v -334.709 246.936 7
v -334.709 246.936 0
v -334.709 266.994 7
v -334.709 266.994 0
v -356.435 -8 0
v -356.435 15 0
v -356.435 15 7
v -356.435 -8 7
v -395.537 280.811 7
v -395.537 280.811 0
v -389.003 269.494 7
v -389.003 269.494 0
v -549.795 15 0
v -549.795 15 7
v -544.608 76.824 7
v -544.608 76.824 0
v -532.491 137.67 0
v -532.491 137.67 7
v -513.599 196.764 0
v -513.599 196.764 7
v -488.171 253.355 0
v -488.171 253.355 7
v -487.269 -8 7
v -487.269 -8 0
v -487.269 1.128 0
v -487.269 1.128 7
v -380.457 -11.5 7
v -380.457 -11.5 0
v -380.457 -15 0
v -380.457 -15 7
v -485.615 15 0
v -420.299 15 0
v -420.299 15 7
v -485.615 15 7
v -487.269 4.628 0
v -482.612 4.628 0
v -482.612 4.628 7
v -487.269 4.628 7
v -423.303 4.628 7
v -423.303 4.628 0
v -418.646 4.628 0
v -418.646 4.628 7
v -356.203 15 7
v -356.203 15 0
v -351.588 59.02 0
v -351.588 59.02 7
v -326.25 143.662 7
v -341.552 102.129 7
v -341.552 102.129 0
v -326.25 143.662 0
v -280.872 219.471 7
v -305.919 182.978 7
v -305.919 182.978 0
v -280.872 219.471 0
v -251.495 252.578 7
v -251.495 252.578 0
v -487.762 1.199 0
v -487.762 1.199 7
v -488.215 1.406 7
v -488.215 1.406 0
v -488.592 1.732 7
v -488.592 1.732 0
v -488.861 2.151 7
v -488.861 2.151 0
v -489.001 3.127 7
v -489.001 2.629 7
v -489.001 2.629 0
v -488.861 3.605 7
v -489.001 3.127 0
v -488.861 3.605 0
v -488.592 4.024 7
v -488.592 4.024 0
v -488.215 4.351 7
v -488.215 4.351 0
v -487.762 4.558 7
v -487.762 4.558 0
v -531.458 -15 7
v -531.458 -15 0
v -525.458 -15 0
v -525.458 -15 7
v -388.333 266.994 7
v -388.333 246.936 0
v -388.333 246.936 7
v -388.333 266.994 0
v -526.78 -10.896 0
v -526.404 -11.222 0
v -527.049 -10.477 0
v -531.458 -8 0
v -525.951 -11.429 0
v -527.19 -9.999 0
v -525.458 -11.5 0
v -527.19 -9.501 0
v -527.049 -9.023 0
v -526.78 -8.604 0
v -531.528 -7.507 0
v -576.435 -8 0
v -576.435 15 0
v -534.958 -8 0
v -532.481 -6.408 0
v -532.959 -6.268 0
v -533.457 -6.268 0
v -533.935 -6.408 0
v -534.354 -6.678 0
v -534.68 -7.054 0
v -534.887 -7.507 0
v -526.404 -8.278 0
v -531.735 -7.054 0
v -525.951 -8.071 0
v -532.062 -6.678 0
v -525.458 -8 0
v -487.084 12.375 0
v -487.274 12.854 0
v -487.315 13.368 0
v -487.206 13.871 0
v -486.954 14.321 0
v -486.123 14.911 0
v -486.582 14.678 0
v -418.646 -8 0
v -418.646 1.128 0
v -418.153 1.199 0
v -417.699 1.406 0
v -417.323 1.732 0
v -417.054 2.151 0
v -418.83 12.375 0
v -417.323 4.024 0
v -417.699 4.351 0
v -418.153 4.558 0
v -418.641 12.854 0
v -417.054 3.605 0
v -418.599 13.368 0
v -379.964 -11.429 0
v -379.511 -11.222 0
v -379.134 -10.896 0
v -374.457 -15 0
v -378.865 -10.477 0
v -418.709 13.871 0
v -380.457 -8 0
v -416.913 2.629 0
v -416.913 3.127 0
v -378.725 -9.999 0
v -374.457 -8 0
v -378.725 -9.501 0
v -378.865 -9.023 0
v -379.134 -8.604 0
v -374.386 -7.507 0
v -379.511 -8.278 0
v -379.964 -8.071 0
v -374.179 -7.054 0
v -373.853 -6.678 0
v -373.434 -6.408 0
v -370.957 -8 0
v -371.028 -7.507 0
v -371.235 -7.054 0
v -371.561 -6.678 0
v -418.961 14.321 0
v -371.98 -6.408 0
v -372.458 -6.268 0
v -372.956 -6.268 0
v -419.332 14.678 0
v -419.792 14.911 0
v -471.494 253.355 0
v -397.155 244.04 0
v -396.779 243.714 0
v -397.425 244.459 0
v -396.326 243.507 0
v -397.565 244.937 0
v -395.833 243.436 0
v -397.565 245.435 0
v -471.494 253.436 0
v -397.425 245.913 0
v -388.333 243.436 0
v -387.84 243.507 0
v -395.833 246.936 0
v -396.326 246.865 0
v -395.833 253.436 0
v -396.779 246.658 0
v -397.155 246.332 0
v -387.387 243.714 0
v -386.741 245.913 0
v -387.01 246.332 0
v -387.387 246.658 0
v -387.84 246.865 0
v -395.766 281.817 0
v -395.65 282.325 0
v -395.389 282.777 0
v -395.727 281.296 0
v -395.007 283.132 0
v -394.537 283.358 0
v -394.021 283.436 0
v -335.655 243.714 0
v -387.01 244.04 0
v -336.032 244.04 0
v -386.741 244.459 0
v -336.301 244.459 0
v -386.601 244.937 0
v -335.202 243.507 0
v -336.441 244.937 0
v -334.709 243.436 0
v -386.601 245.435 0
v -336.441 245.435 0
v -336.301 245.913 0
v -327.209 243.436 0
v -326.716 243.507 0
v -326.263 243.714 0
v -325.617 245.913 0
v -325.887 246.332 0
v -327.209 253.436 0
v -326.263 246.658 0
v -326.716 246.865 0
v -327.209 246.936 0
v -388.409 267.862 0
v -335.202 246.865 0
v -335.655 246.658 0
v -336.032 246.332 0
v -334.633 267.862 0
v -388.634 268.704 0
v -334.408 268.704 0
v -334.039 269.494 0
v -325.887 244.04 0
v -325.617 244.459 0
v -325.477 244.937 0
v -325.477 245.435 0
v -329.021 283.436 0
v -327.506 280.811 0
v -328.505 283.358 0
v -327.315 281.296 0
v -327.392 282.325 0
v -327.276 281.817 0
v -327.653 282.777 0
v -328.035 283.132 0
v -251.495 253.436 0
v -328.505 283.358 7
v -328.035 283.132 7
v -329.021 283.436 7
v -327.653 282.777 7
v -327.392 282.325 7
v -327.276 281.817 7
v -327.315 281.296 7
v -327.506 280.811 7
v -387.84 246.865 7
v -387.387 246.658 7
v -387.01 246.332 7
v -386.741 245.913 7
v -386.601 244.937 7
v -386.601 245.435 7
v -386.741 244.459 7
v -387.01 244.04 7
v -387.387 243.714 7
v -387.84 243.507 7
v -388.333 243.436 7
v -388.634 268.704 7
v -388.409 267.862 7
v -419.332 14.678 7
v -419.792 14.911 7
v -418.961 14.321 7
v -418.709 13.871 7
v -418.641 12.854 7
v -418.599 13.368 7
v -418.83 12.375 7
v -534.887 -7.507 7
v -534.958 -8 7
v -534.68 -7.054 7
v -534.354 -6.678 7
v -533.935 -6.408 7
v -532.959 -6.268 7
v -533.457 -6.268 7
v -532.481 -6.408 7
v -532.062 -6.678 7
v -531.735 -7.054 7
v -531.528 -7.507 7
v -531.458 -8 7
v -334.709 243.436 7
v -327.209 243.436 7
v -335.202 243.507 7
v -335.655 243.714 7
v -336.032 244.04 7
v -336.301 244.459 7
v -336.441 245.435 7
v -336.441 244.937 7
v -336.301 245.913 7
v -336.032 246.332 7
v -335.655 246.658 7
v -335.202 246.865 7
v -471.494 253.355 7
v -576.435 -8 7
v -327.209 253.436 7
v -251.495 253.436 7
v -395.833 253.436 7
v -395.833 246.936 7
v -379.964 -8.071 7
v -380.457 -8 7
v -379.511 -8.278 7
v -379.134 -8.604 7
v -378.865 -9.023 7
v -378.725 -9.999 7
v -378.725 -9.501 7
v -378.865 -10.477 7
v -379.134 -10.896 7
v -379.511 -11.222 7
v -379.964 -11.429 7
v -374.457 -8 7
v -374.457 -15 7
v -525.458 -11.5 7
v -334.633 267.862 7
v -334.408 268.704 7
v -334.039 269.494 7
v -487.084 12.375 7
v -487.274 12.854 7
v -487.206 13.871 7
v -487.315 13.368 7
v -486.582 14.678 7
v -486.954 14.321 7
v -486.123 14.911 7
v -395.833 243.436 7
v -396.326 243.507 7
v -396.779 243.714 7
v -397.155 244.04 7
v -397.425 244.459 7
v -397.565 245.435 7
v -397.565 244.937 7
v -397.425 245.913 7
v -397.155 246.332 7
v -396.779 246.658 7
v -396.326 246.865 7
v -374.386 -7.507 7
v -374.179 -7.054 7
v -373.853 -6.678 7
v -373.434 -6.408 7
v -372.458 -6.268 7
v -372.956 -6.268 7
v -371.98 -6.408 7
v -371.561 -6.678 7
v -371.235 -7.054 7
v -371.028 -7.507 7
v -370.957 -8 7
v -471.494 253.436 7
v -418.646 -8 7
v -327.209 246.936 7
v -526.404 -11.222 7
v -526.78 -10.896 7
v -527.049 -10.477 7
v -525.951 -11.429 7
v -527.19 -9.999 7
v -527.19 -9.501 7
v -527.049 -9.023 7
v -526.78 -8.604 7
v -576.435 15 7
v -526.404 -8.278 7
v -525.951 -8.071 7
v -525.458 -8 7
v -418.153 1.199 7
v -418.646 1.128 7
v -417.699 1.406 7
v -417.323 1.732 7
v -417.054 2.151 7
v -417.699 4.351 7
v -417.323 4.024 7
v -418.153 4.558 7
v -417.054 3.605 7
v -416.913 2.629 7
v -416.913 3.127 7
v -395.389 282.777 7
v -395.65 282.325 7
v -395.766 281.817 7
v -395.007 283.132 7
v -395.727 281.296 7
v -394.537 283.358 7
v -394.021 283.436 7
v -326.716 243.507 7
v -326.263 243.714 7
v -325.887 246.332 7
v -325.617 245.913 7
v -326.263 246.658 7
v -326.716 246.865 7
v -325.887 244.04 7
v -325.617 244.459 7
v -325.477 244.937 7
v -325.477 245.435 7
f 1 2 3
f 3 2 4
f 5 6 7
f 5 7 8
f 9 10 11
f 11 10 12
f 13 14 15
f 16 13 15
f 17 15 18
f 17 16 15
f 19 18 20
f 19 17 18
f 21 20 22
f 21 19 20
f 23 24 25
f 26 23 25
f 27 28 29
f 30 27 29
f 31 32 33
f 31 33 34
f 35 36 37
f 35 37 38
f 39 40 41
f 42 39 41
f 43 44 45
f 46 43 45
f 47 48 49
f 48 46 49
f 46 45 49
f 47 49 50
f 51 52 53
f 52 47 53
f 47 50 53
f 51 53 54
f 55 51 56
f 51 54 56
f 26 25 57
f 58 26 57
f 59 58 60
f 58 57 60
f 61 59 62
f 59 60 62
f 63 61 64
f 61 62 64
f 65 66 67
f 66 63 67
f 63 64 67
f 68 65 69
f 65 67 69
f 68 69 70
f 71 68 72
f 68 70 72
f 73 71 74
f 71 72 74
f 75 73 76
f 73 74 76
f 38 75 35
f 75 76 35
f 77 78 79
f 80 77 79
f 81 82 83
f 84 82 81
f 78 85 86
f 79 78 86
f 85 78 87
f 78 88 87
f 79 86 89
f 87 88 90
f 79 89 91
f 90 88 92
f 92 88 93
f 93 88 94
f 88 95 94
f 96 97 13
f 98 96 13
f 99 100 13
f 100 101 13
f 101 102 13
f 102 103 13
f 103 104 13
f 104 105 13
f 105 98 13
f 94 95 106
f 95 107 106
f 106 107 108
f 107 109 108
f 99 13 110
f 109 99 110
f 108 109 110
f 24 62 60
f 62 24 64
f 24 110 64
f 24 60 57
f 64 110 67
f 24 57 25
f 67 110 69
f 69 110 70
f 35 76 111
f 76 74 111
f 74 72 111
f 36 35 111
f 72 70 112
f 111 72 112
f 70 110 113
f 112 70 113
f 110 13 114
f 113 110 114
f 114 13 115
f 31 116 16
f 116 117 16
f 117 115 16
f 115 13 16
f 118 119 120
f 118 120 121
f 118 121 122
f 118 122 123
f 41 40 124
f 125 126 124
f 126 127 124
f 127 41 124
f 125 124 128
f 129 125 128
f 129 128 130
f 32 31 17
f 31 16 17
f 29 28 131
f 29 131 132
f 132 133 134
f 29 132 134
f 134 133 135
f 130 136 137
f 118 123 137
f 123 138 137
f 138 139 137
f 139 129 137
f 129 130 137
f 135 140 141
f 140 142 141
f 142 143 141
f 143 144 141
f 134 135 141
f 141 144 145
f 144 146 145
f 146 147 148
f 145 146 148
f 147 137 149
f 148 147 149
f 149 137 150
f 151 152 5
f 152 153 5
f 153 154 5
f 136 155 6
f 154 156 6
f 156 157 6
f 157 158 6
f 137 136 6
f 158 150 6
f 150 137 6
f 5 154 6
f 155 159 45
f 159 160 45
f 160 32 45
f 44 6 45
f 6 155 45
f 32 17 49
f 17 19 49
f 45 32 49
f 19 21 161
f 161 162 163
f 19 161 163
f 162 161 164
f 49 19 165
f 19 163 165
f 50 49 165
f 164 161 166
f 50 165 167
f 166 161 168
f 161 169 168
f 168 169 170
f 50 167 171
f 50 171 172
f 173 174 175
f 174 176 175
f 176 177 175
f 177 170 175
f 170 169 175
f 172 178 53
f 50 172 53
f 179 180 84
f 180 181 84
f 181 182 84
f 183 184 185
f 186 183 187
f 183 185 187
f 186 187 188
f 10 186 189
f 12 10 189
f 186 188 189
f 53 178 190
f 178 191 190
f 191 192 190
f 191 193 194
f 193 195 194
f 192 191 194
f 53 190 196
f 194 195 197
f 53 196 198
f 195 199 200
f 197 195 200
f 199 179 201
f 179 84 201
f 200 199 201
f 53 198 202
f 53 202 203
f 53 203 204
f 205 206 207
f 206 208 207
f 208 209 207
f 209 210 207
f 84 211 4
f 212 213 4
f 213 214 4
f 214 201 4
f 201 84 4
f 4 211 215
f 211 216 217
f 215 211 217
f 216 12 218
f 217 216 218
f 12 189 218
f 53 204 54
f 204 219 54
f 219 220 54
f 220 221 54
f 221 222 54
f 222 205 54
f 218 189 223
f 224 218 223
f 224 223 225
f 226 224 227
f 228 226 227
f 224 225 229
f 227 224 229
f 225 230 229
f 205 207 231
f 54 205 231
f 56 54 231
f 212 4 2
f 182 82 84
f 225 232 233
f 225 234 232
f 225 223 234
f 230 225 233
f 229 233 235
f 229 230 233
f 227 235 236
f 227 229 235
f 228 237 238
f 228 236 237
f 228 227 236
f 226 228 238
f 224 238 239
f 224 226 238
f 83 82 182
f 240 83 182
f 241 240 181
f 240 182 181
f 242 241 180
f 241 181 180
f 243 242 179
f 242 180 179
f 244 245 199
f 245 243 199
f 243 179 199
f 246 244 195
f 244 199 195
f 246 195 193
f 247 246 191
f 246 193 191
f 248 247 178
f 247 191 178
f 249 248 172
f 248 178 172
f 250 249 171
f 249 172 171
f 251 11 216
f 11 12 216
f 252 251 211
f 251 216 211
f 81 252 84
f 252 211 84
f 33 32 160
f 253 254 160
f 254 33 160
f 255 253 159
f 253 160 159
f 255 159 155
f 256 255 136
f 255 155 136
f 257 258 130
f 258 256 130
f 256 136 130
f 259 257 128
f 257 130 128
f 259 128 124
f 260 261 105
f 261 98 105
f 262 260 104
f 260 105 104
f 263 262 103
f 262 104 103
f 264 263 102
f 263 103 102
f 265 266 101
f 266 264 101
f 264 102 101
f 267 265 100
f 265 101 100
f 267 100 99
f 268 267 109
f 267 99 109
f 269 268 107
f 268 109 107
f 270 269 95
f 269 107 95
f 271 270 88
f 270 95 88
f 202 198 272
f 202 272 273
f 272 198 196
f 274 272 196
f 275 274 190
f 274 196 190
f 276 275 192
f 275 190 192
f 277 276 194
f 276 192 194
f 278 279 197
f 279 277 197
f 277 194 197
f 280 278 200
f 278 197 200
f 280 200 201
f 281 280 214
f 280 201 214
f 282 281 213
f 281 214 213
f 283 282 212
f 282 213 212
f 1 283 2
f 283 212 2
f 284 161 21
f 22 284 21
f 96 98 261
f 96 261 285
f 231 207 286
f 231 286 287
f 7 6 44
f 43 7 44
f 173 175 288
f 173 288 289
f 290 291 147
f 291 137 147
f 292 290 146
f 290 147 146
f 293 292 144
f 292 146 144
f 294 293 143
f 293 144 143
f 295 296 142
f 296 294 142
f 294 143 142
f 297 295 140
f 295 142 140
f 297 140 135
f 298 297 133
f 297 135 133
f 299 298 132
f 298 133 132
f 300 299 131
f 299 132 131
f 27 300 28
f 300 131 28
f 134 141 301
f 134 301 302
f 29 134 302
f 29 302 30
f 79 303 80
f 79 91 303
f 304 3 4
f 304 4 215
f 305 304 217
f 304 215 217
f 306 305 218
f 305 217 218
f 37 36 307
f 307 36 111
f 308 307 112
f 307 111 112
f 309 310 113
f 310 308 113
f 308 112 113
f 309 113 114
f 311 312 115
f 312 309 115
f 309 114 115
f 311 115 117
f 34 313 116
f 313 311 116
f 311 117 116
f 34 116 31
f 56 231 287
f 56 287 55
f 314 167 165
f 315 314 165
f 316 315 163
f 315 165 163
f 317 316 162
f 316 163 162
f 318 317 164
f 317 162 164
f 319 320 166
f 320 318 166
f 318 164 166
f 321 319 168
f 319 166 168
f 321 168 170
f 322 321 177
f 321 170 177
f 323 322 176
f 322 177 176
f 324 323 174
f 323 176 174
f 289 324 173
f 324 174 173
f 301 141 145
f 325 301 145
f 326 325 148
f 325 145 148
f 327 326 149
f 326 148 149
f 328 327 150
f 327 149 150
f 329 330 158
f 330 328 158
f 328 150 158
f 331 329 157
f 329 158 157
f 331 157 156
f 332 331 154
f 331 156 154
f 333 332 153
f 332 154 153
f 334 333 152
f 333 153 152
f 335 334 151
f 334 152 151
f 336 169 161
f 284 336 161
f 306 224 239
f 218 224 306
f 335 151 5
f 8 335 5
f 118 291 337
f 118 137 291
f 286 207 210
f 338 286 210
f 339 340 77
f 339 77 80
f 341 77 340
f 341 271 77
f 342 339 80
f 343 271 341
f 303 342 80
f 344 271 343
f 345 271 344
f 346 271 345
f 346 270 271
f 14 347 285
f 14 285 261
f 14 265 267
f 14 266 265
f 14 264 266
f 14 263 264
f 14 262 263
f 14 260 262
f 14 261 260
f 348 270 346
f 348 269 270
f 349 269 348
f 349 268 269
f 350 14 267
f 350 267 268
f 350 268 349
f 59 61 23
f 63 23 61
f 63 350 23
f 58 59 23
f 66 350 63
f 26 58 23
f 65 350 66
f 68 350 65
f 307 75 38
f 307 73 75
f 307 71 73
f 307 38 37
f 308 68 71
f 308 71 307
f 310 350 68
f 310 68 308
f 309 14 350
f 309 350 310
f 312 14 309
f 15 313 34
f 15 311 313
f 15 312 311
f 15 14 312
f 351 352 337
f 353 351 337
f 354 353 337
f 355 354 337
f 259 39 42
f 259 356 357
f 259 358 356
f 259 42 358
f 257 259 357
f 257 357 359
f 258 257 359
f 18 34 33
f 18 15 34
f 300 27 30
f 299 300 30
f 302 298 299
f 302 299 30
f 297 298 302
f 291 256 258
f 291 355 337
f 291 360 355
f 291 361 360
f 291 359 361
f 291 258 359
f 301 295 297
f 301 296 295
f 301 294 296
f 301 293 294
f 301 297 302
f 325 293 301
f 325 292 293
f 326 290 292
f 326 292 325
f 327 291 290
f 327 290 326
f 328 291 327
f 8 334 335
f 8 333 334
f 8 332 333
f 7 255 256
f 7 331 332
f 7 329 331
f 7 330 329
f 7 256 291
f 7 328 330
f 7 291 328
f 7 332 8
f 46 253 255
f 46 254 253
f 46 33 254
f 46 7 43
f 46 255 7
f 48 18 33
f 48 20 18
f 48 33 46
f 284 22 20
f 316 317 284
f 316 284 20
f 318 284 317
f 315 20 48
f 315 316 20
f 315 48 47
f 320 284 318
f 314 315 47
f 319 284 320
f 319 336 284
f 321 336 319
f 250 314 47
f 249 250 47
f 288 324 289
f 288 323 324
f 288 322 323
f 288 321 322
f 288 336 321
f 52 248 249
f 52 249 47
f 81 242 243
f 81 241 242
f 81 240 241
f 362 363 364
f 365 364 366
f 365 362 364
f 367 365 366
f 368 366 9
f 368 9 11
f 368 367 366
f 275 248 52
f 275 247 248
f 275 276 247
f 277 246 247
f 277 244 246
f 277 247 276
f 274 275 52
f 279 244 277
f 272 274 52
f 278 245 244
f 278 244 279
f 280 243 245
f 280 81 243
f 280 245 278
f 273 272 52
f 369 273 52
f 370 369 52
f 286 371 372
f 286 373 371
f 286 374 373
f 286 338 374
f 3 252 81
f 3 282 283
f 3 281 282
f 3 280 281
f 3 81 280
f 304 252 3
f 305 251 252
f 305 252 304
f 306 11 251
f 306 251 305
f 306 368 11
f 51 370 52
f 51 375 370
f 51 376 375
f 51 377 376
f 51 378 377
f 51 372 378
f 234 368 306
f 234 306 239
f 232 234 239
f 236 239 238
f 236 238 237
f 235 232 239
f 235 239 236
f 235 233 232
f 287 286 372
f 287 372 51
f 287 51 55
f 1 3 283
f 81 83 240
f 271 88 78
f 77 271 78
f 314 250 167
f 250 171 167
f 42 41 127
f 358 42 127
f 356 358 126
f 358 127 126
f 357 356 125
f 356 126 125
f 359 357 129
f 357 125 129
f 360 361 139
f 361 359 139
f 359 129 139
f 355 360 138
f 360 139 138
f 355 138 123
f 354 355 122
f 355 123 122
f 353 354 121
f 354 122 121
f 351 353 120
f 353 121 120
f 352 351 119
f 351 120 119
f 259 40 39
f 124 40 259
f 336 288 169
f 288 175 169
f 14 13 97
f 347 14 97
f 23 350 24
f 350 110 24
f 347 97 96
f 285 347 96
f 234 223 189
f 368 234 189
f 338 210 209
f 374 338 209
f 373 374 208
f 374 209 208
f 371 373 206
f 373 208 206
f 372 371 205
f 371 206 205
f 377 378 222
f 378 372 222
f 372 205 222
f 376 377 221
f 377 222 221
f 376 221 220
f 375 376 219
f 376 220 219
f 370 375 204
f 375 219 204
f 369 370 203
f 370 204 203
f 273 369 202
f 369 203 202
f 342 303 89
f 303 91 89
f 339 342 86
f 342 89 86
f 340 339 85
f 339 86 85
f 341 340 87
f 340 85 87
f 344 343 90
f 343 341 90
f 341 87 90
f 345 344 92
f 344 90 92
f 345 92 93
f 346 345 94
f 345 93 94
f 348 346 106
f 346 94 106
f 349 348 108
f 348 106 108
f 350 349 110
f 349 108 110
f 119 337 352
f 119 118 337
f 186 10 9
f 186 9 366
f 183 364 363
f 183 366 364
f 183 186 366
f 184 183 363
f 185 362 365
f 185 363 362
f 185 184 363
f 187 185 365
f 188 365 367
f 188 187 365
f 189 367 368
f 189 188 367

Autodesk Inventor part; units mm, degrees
ref_plane "YZ Plane" through (0, 0, 0) normal (1, 0, 0) x (0, 1, 0)
ref_plane "XZ Plane" through (0, 0, 0) normal (0, 1, 0) x (-1, 0, 0)
ref_plane "XY Plane" through (0, 0, 0) normal (0, 0, 1) x (1, 0, 0)
sketch "Sketch1" plane through (0, 0, 0) normal (0, 0, 1) x (1, 0, 0)
  arc A0 (0, 550) -> (-200, 512.3475) centre (0, 0) ccw construction
  line L0 (-150, -512.4764) -> (-150, -323.4644) construction
  line L1 (-472.3938, -281.6809) -> (-252.3938, -281.6809) construction
  line L2 (-489.0365, 251.6809) -> (-252.3938, 251.6809) construction
  line L3 (-150.0879, 323.2475) -> (-150.0879, 512.2595) construction
  line L4 (-472.3938, 281.6809) -> (-252.3938, 281.6809) construction
  line L5 (-472.3938, -251.6809) -> (-252.3938, -251.6809) construction
  line L6 (-356.435, 15) -> (-576.435, 15) construction
  line L7 (-472.3938, -281.6809) -> (-472.3938, -251.6809) construction
  line L8 (-252.3938, -281.6809) -> (-252.3938, -251.6809) construction
  line L9 (-252.3938, 281.6809) -> (-252.3938, 251.6809) construction
  line L10 (-472.3938, 281.6809) -> (-472.3938, 251.6809) construction
  line L11 (-356.435, 15) -> (-356.435, -15) construction
  line L12 (-356.435, -15) -> (-576.435, -15) construction
  line L13 (-576.435, -15) -> (-576.435, 15) construction
  arc A1 (-0.0879, 356.3469) -> (-150.0879, 323.2475) centre (-0.0879, -0.0881) ccw construction
  arc A2 (-150, -323.4644) -> (-1.4799, -356.5203) centre (-0.0879, -0.0881) ccw construction
  arc A3 (-156.5047, -512.4764) -> (-160, -512.3475) centre (-158.25, -512.3475) ccw construction
  arc A4 (-190, -512.3475) -> (-193.5, -512.3475) centre (-191.75, -512.3475) ccw construction
  line L14 (-178.75, -519.0975) -> (-175, -519.0975) construction
  line L15 (-178.75, -529.0975) -> (-175, -529.0975) construction
  line L16 (-175, -519.0975) -> (-175, -529.0975) construction
  arc A5 (-178.75, -519.0975) -> (-178.75, -522.5975) centre (-178.75, -520.8475) ccw construction
  arc A6 (-178.75, -525.5975) -> (-178.75, -529.0975) centre (-178.75, -527.3475) ccw construction
  line L17 (-171.25, -519.0975) -> (-175, -519.0975) construction
  line L18 (-171.25, -529.0975) -> (-175, -529.0975) construction
  arc A7 (-171.25, -522.5975) -> (-171.25, -519.0975) centre (-171.25, -520.8475) ccw construction
  arc A8 (-171.25, -529.0975) -> (-171.25, -525.5975) centre (-171.25, -527.3475) ccw construction
  line L19 (-252.3938, 251.6809) -> (-489.0365, 251.6809) construction
  arc A9 (-192.6667, 512.3475) -> (-190, 512.3475) centre (-191.3333, 512.3475) ccw construction
  line L20 (-157.3333, 512.3475) -> (-150, 512.3475) construction
  line L21 (-192.6667, 512.3475) -> (-200, 512.3475) construction
  arc A10 (-160, 512.3475) -> (-157.3333, 512.3475) centre (-158.6667, 512.3475) ccw construction
  line L22 (-171.25, 517.8475) -> (-175, 517.8475) construction
  line L23 (-171.25, 520.5142) -> (-171.25, 525.1809) construction
  line L24 (-161.3333, 532.3475) -> (-188.6667, 532.3475) construction
  line L25 (-190, 531.0142) -> (-190, 512.3475) construction
  line L26 (-160, 531.0142) -> (-160, 512.3475) construction
  arc A11 (-160, 531.0142) -> (-161.3333, 532.3475) centre (-161.3333, 531.0142) ccw construction
  arc A12 (-188.6667, 532.3475) -> (-190, 531.0142) centre (-188.6667, 531.0142) ccw construction
  line L27 (-171.25, 527.8475) -> (-175, 527.8475) construction
  line L28 (-175, 532.3475) -> (-175, 535.9358) construction
  line L29 (-175, 517.8475) -> (-175, 527.8475) construction
  arc A13 (-171.25, 517.8475) -> (-171.25, 520.5142) centre (-171.25, 519.1809) ccw construction
  arc A14 (-171.25, 525.1809) -> (-171.25, 527.8475) centre (-171.25, 526.5142) ccw construction
  line L30 (-178.75, 517.8475) -> (-175, 517.8475) construction
  arc A15 (-178.75, 520.5142) -> (-178.75, 517.8475) centre (-178.75, 519.1809) ccw construction
  line L31 (-178.75, 520.5142) -> (-178.75, 525.1809) construction
  arc A16 (-178.75, 527.8475) -> (-178.75, 525.1809) centre (-178.75, 526.5142) ccw construction
  line L32 (-178.75, 527.8475) -> (-175, 527.8475) construction
  arc A17 (-334.9122, -265.623) -> (-335.582, -268.123) centre (-330.582, -268.123) ccw construction
  line L33 (-328.3782, -254.3059) -> (-334.9122, -265.623) construction
  arc A18 (-328.3782, -254.3059) -> (-329.8938, -251.6809) centre (-329.8938, -253.4309) ccw construction
  line L34 (-329.8938, -251.6809) -> (-394.8938, -251.6809) construction
  line L35 (-362.3938, -251.6809) -> (-362.3938, -293.6041) construction
  arc A19 (-389.2055, -268.123) -> (-389.8754, -265.623) centre (-394.2055, -268.123) ccw construction
  arc A20 (-394.8938, -251.6809) -> (-396.4093, -254.3059) centre (-394.8938, -253.4309) ccw construction
  line L36 (-396.4093, -254.3059) -> (-389.8754, -265.623) construction
  arc A21 (-389.2055, -291.6809) -> (-389.2055, -288.1809) centre (-389.2055, -289.9309) ccw construction
  line L37 (-389.2055, -291.6809) -> (-396.7055, -291.6809) construction
  line L38 (-396.7055, -281.6809) -> (-472.3938, -281.6809) construction
  line L39 (-328.082, -281.6809) -> (-252.3938, -281.6809) construction
  line L40 (-252.4816, -287.4356) -> (-210.9842, -287.4356) construction
  arc A22 (-150.0879, 323.2475) -> (-250.6303, 253.4358) centre (-0.0879, -0.0881) ccw construction
  arc A23 (-210.9842, -287.4356) -> (-150, -323.4644) centre (-0.0879, -0.0881) ccw construction
  arc A24 (-200, 512.3475) -> (-491.4496, 246.9358) centre (0, 0) ccw construction
  arc A25 (-472.3938, -281.6809) -> (-246.475, -491.6809) centre (0, 0) ccw construction
  line L41 (-171.25, -436.2204) -> (-171.25, -399.7204) construction
  line L42 (-178.75, -436.2204) -> (-178.75, -399.7204) construction
  line L43 (-177, -437.9704) -> (-173, -437.9704) construction
  line L44 (-177, -397.9704) -> (-173, -397.9704) construction
  arc A26 (-177, -397.9704) -> (-178.75, -399.7204) centre (-177, -399.7204) ccw construction
  arc A27 (-178.75, -436.2204) -> (-177, -437.9704) centre (-177, -436.2204) ccw construction
  arc A28 (-173, -437.9704) -> (-171.25, -436.2204) centre (-173, -436.2204) ccw construction
  arc A29 (-171.25, -399.7204) -> (-173, -397.9704) centre (-173, -399.7204) ccw construction
  line L45 (-200, -512.3475) -> (-200, -491.6809) construction
  arc A30 (-200, -491.6809) -> (-203.5, -491.6809) centre (-201.75, -491.6809) ccw construction
  line L46 (-160, -512.3475) -> (-160, -532.5975) construction
  line L47 (-161.75, -534.3475) -> (-188.25, -534.3475) construction
  line L48 (-190, -532.5975) -> (-190, -512.3475) construction
  line L49 (-171.25, -522.5975) -> (-171.25, -525.5975) construction
  line L50 (-178.75, -522.5975) -> (-178.75, -525.5975) construction
  arc A31 (-190, -532.5975) -> (-188.25, -534.3475) centre (-188.25, -532.5975) ccw construction
  arc A32 (-161.75, -534.3475) -> (-160, -532.5975) centre (-161.75, -532.5975) ccw construction
  line L51 (-156.5047, -512.4764) -> (-150, -512.4764) construction
  line L52 (-193.5, -512.3475) -> (-200, -512.3475) construction
  line L53 (-203.5, -491.6809) -> (-246.475, -491.6809) construction
  arc A33 (-396.7055, -288.1809) -> (-396.7055, -291.6809) centre (-396.7055, -289.9309) ccw construction
  line L54 (-396.7055, -281.6809) -> (-396.7055, -288.1809) construction
  line L55 (-389.2055, -288.1809) -> (-389.2055, -268.123) construction
  arc A34 (-335.582, -288.1809) -> (-335.582, -291.6809) centre (-335.582, -289.9309) ccw construction
  line L56 (-335.582, -291.6809) -> (-328.082, -291.6809) construction
  arc A35 (-328.082, -291.6809) -> (-328.082, -288.1809) centre (-328.082, -289.9309) ccw construction
  line L57 (-328.082, -281.6809) -> (-328.082, -288.1809) construction
  line L58 (-335.582, -288.1809) -> (-335.582, -268.123) construction
  arc A36 (-252.3938, -283.9378) -> (-252.4816, -287.4356) centre (-252.4816, -285.6856) ccw construction
  line L59 (-252.3938, -283.9378) -> (-252.3938, -281.6809) construction
  arc A37 (-479.7691, -25) -> (-479.7691, -21.5) centre (-479.7691, -23.25) ccw construction
  arc A38 (-479.7691, -1.4421) -> (-480.4389, 1.0579) centre (-484.7691, -1.4421) ccw construction
  line L60 (-486.9729, 12.375) -> (-480.4389, 1.0579) construction
  arc A39 (-485.4573, 15) -> (-486.9729, 12.375) centre (-485.4573, 13.25) ccw construction
  line L61 (-420.4573, 15) -> (-485.4573, 15) construction
  arc A40 (-425.4757, 1.0579) -> (-426.1456, -1.4421) centre (-421.1456, -1.4421) ccw construction
  arc A41 (-418.9418, 12.375) -> (-420.4573, 15) centre (-420.4573, 13.25) ccw construction
  line L62 (-418.9418, 12.375) -> (-425.4757, 1.0579) construction
  line L63 (-452.9573, 15) -> (-452.9573, -26.9232) construction
  line L64 (-479.7691, -25) -> (-487.2691, -25) construction
  line L65 (-487.2691, -15) -> (-549.7954, -15) construction
  arc A42 (-487.2691, -21.5) -> (-487.2691, -25) centre (-487.2691, -23.25) ccw construction
  line L66 (-487.2691, -15) -> (-487.2691, -21.5) construction
  line L67 (-479.7691, -21.5) -> (-479.7691, -1.4421) construction
  line L68 (-426.1456, -21.5) -> (-426.1456, -1.4421) construction
  arc A43 (-426.1456, -21.5) -> (-426.1456, -25) centre (-426.1456, -23.25) ccw construction
  line L69 (-426.1456, -25) -> (-418.6456, -25) construction
  arc A44 (-418.6456, -25) -> (-418.6456, -21.5) centre (-418.6456, -23.25) ccw construction
  line L70 (-418.6456, -15) -> (-418.6456, -21.5) construction
  line L71 (276.2049, -135.3556) -> (280.6774, -127.609)
  line L72 (279.2083, -124.984) -> (246.5502, -124.984)
  arc A45 (319.0505, -151.484) -> (319.0505, -147.984) centre (319.0505, -149.734) ccw
  arc A46 (328.5505, -147.9841) -> (325.0505, -147.9841) centre (326.8005, -147.9841) ccw
  line L73 (319.0505, -147.984) -> (280.8619, -147.984)
  arc A47 (214.0502, -164.7817) -> (212.5346, -167.4067) centre (214.0502, -166.5317) ccw
  arc A48 (280.5657, -167.4067) -> (279.0502, -164.7817) centre (279.0502, -166.5317) ccw
  arc A49 (274.0318, -178.7238) -> (273.3619, -181.2238) centre (278.3619, -181.2238) ccw
  line L74 (280.5657, -167.4067) -> (274.0318, -178.7238)
  line L75 (273.3619, -201.2817) -> (273.3619, -181.2238)
  arc A50 (273.3619, -201.2817) -> (273.3619, -204.7817) centre (273.3619, -203.0317) ccw
  line L76 (273.3619, -204.7817) -> (280.8619, -204.7817)
  arc A51 (280.8619, -204.7817) -> (280.8619, -201.2817) centre (280.8619, -203.0317) ccw
  line L77 (280.8619, -194.7817) -> (280.8619, -201.2817)
  line L78 (212.2384, -194.7817) -> (212.2384, -201.2817)
  arc A52 (212.2384, -201.2817) -> (212.2384, -204.7817) centre (212.2384, -203.0317) ccw
  arc A53 (219.7384, -204.7817) -> (219.7384, -201.2817) centre (219.7384, -203.0317) ccw
  line L79 (279.0502, -164.7817) -> (214.0502, -164.7817)
  line L80 (219.7384, -201.2817) -> (219.7384, -181.2238)
  line L81 (219.7384, -204.7817) -> (212.2384, -204.7817)
  arc A54 (219.7384, -181.2238) -> (219.0686, -178.7238) centre (214.7384, -181.2238) ccw
  line L82 (212.5346, -167.4067) -> (219.0686, -178.7238)
  line L83 (212.2384, -194.7817) -> (136.5502, -194.7817)
  line L84 (280.8619, -194.7817) -> (356.5502, -194.7817)
  line L85 (325.0505, -147.9841) -> (325.0505, -154.9841)
  line L86 (325.0505, -154.9841) -> (319.0505, -154.9841)
  line L87 (319.0505, -151.484) -> (319.0505, -154.9841)
  line L88 (246.5502, -124.984) -> (246.5502, -110.6064)
  arc A55 (280.6774, -127.609) -> (279.2083, -124.984) centre (279.1622, -126.7334) ccw
  arc A56 (280.8619, -138.8556) -> (280.8619, -135.3556) centre (280.8619, -137.1056) ccw
  line L89 (276.2049, -135.3556) -> (280.8619, -135.3556)
  line L90 (246.5502, -164.7817) -> (246.5502, -170.2759)
  line L91 (280.8619, -147.984) -> (280.8619, -138.8556)
  arc A57 (168.0499, -147.9841) -> (164.5499, -147.9841) centre (166.2999, -147.9841) ccw
  arc A58 (174.0499, -147.984) -> (174.0499, -151.484) centre (174.0499, -149.734) ccw
  line L92 (213.8921, -124.984) -> (246.5502, -124.984)
  line L93 (174.0499, -147.984) -> (212.2384, -147.984)
  line L94 (216.8955, -135.3556) -> (212.423, -127.609)
  line L95 (168.0499, -147.9841) -> (168.0499, -154.9841)
  line L96 (168.0499, -154.9841) -> (174.0499, -154.9841)
  line L97 (174.0499, -151.484) -> (174.0499, -154.9841)
  arc A59 (213.8921, -124.984) -> (212.423, -127.609) centre (213.9382, -126.7334) ccw
  arc A60 (212.2384, -135.3556) -> (212.2384, -138.8556) centre (212.2384, -137.1056) ccw
  line L98 (216.8955, -135.3556) -> (212.2384, -135.3556)
  line L99 (212.2384, -147.984) -> (212.2384, -138.8556)
  arc A61 (-280.4036, -274.8689) -> (-283.8935, -274.681) centre (-282.1435, -274.681) ccw construction
  arc A62 (-289.8935, -278.1809) -> (-289.8935, -274.6809) centre (-289.8935, -276.4309) ccw construction
  line L100 (-329.7357, -251.6809) -> (-362.3938, -251.6809) construction
  line L101 (-289.8935, -274.6809) -> (-328.082, -274.6809) construction
  line L102 (-332.7391, -262.0525) -> (-328.2666, -254.3059) construction
  line L103 (-283.8935, -274.681) -> (-283.8935, -281.681) construction
  line L104 (-283.8935, -281.681) -> (-289.8935, -281.681) construction
  line L105 (-289.8935, -278.1809) -> (-289.8935, -281.681) construction
  arc A63 (-328.2666, -254.3059) -> (-329.7357, -251.6809) centre (-329.7818, -253.4303) ccw construction
  arc A64 (-328.082, -265.5525) -> (-328.082, -262.0525) centre (-328.082, -263.8025) ccw construction
  line L106 (-332.7391, -262.0525) -> (-328.082, -262.0525) construction
  line L107 (-328.082, -274.6809) -> (-328.082, -265.5525) construction
  line L108 (-392.0485, -262.0525) -> (-396.7055, -262.0525) construction
  arc A65 (-396.7055, -262.0525) -> (-396.7055, -265.5525) centre (-396.7055, -263.8025) ccw construction
  line L109 (-392.0485, -262.0525) -> (-396.521, -254.3059) construction
  arc A66 (-395.0519, -251.6809) -> (-396.521, -254.3059) centre (-395.0058, -253.4303) ccw construction
  line L110 (-396.7055, -274.6809) -> (-396.7055, -265.5525) construction
  line L111 (-434.8941, -278.1809) -> (-434.8941, -281.681) construction
  line L112 (-434.8941, -274.6809) -> (-396.7055, -274.6809) construction
  arc A67 (-434.8941, -274.6809) -> (-434.8941, -278.1809) centre (-434.8941, -276.4309) ccw construction
  line L113 (-440.8941, -281.681) -> (-434.8941, -281.681) construction
  line L114 (-440.8941, -274.681) -> (-440.8941, -281.681) construction
  arc A68 (-440.8941, -274.681) -> (-444.3912, -274.7808) centre (-442.6441, -274.681) ccw construction
  line L115 (-395.0519, -251.6809) -> (-362.3938, -251.6809) construction
  line L116 (-444.3912, -274.7808) -> (-476.4404, -274.7808) construction
  arc A69 (-355.8791, -21.5) -> (-227.1151, -274.8689) centre (-0.0879, -0.0881) ccw construction
  arc A70 (-549.7954, -15) -> (-476.4404, -274.7808) centre (0, 0) ccw construction
  line L117 (-280.4036, -274.8689) -> (-227.1151, -274.8689) construction
  line L118 (-364.1192, -15) -> (-364.1192, -18) construction
  arc A71 (-364.1192, -18) -> (-364.1192, -21.5) centre (-364.1192, -19.75) ccw construction
  line L119 (-364.1192, -21.5) -> (-355.8791, -21.5) construction
  line L120 (-356.1192, -15) -> (-356.435, -15) construction
  line L121 (-364.1192, -15) -> (-549.7954, -15) construction
  line L122 (-418.6456, -15) -> (-364.1192, -15) construction
  arc A72 (-370.957, -8.0002) -> (-374.457, -8.0002) centre (-372.707, -8.0002) ccw
  arc A73 (-380.457, -11.5) -> (-380.457, -8) centre (-380.457, -9.75) ccw
  line L123 (-420.2992, 15) -> (-452.9573, 15)
  line L124 (-380.457, -8) -> (-418.6456, -8)
  line L125 (-423.3026, 4.6284) -> (-418.8301, 12.375)
  line L126 (-374.457, -8.0002) -> (-374.457, -15.0002)
  line L127 (-374.457, -15.0002) -> (-380.457, -15.0002)
  line L128 (-380.457, -11.5) -> (-380.457, -15.0002)
  line L129 (-452.9573, 15) -> (-452.9573, 29.3776)
  arc A74 (-418.8301, 12.375) -> (-420.2992, 15) centre (-420.3453, 13.2506) ccw
  arc A75 (-418.6456, 1.1284) -> (-418.6456, 4.6284) centre (-418.6456, 2.8784) ccw
  line L130 (-423.3026, 4.6284) -> (-418.6456, 4.6284)
  line L131 (-418.6456, -8) -> (-418.6456, 1.1284)
  line L132 (-482.612, 4.6284) -> (-487.2691, 4.6284)
  arc A76 (-487.2691, 4.6284) -> (-487.2691, 1.1284) centre (-487.2691, 2.8784) ccw
  line L133 (-482.612, 4.6284) -> (-487.0845, 12.375)
  arc A77 (-485.6154, 15) -> (-487.0845, 12.375) centre (-485.5693, 13.2506) ccw
  line L134 (-487.2691, -8) -> (-487.2691, 1.1284)
  line L135 (-525.4576, -11.5) -> (-525.4576, -15.0002)
  line L136 (-525.4576, -8) -> (-487.2691, -8)
  arc A78 (-525.4576, -8) -> (-525.4576, -11.5) centre (-525.4576, -9.75) ccw
  line L137 (-531.4576, -15.0002) -> (-525.4576, -15.0002)
  line L138 (-531.4576, -8.0002) -> (-531.4576, -15.0002)
  arc A79 (-531.4576, -8.0002) -> (-534.9576, -8.0002) centre (-533.2076, -8.0002) ccw
  line L139 (-485.6154, 15) -> (-452.9573, 15)
  line L140 (-370.957, -8.0002) -> (-356.435, -8.0002)
  line L141 (-534.9576, -8.0002) -> (-549.9418, -8.0002)
  line L142 (-395.8328, 253.4358) -> (-471.4936, 253.4358)
  arc A80 (-488.1712, 253.3553) -> (-549.7954, 15) centre (0, 0) ccw
  line L143 (-549.7954, 15) -> (-576.435, 15)
  line L144 (-576.435, 15) -> (-576.435, -8.0002)
  line L145 (-549.9418, -8.0002) -> (-576.435, -8.0002)
  line L146 (-356.435, 15) -> (-356.435, -8.0002)
  line L147 (-356.435, 15) -> (-356.2033, 15)
  arc A81 (-251.4953, 252.5781) -> (-356.2033, 15) centre (-0.0879, -0.0881) ccw
  arc A82 (-356.435, 7.824) -> (-356.435, -8.0002) centre (-0.0879, -0.0881) ccw
  arc A83 (-250.6303, 253.4358) -> (-251.4953, 252.5781) centre (-0.0879, -0.0881) ccw
  line L148 (-327.2093, 253.4358) -> (-327.2093, 246.9358)
  arc A84 (-327.2093, 243.4358) -> (-327.2093, 246.9358) centre (-327.2093, 245.1858) ccw
  line L149 (-395.8328, 253.4358) -> (-395.8328, 246.9358)
  arc A85 (-395.8328, 246.9358) -> (-395.8328, 243.4358) centre (-395.8328, 245.1858) ccw
  arc A86 (-388.3328, 243.4358) -> (-388.3328, 246.9358) centre (-388.3328, 245.1858) ccw
  line L150 (-388.3328, 246.9358) -> (-388.3328, 266.9938)
  line L151 (-388.3328, 243.4358) -> (-395.8328, 243.4358)
  arc A87 (-388.3328, 266.9938) -> (-389.0027, 269.4938) centre (-393.3328, 266.9938) ccw
  line L152 (-395.5366, 280.8108) -> (-389.0027, 269.4938)
  arc A88 (-394.021, 283.4358) -> (-395.5366, 280.8108) centre (-394.021, 281.6858) ccw
  line L153 (-329.021, 283.4358) -> (-394.021, 283.4358)
  arc A89 (-334.0394, 269.4938) -> (-334.7093, 266.9938) centre (-329.7093, 266.9938) ccw
  arc A90 (-327.5055, 280.8108) -> (-329.021, 283.4358) centre (-329.021, 281.6858) ccw
  line L154 (-327.5055, 280.8108) -> (-334.0394, 269.4938)
  arc A91 (-334.7093, 246.9358) -> (-334.7093, 243.4358) centre (-334.7093, 245.1858) ccw
  line L155 (-334.7093, 243.4358) -> (-327.2093, 243.4358)
  line L156 (-334.7093, 246.9358) -> (-334.7093, 266.9938)
  line L157 (-361.521, 283.4358) -> (-361.521, 277.9417)
  line L158 (-327.2093, 253.4358) -> (-250.6303, 253.4358)
  line L159 (-251.4953, 253.4358) -> (-251.4953, 252.5781)
  line L160 (-471.4936, 253.3553) -> (-488.1712, 253.3553)
  line L161 (-471.4936, 253.4358) -> (-471.4936, 253.3553)
  line L162 (-471.4936, 251.6809) -> (-471.4936, 250.4358)
  point P0 (0, 512.3475)
  point P1 (0, -512.3475)
  point P2 (0, 0)
  point P3 (-190, -534.3475)
  point P4 (-160, -534.3475)
  point P5 (-59.9119, -534.1417)
  point P6 (-160, 532.3475)
  point P7 (-190, 532.3475)
  point P8 (-389.2055, -259.0142)
  point P9 (-479.7691, 7.6667)
  point P10 (328.5476, -148.0839)
  point P11 (328.0311, -152.0673)
  point P12 (329.3645, -149.3173)
  point P13 (219.7384, -172.1151)
  point P14 (164.5527, -148.0839)
  point P15 (165.0692, -152.0673)
  point P16 (163.7359, -149.3173)
  point P17 (-280.9128, -278.7642)
  point P18 (-279.5795, -276.0142)
  point P19 (-443.8747, -278.7642)
  point P20 (-445.2081, -276.0142)
  point P21 (-370.9599, -8.1)
  point P22 (-371.4764, -12.0833)
  point P23 (-370.143, -9.3333)
  point P24 (-534.4382, -12.0833)
  point P25 (-534.9548, -8.1)
  point P26 (-535.7716, -9.3333)
  point P27 (-388.3328, 276.1025)
  dimension "d13" = 550
  dimension "d17" = 200
  dimension "d18" = 0
  dimension "d19" = 150
  dimension "d54" = 220
  dimension "d56" = 220
  dimension "d57" = 30
  dimension "d73" = 236.6809
  dimension "d74" = 236.6809
  dimension "d75" = 576.435
  dimension "d76" = 472.3938
  dimension "d77" = 472.3938
  dimension "d78" = 30
  dimension "d81" = 220
  dimension "d82" = 252.3938
  dimension "d85" = 356.435
  dimension "d88" = 3.5
  dimension "d89" = 30
  dimension "d90" = 22
  dimension "d91" = 3.5
  dimension "d103" = 3.75
  dimension "d104" = 3.75
  dimension "d105" = 2.6667
  dimension "d106" = 30
  dimension "d107" = 20
  dimension "d108" = 2.6667
  dimension "d109" = 1.3333
  dimension "d110" = 7.3333
  dimension "d111" = 7.3333
  dimension "d112" = 7.5
  dimension "d113" = 3.75
  dimension "d114" = 3.75
  dimension "d134" = 3.5
  dimension "d135" = 65
  dimension "d136" = 65
  dimension "d137" = 7.3333
  dimension "d138" = 60
  dimension "d139" = 5
  dimension "d140" = 7.5
  dimension "d148" = 1.75
  dimension "d151" = 40
  dimension "d152" = 74.506
  dimension "d153" = 20.6667
  dimension "d154" = 3.5
  dimension "d155" = 189.012
  dimension "d159" = 1.75
  dimension "d160" = 1.75
  dimension "d161" = 1.75
  dimension "d164" = 7.5
  dimension "d168" = 21.25
  dimension "d170" = 30
  dimension "d171" = 1.75
  dimension "d172" = 10
  dimension "d173" = 3.5
  dimension "d177" = 3.5
  dimension "d178" = 65
  dimension "d179" = 65
  dimension "d180" = 7.3333
  dimension "d181" = 60
  dimension "d182" = 5
  dimension "d183" = 7.5
  dimension "d185" = 1.75
  dimension "d186" = 10
  dimension "d192" = 1.75
extrude "Extrusion3" add sketch "Sketch1" along normal blind 7 contours A72 L126 L127 L128 A73 L124 L131 A75 L130 L125 A74 L123 L139 A77 L133 L132 A76 L134 L136 A78 L135 L137 L138 A79 L141 L145 L144 L143 A80 L160 L161 L142 L149 A85 L151 A86 L150 A87 L152 A88 L153 A90 L154 A89 L156 A91 L155 A84 L148 L158 L159 A81 L147 L146 A82 L140 | A82 L146
properties part number "Support C - V2"
